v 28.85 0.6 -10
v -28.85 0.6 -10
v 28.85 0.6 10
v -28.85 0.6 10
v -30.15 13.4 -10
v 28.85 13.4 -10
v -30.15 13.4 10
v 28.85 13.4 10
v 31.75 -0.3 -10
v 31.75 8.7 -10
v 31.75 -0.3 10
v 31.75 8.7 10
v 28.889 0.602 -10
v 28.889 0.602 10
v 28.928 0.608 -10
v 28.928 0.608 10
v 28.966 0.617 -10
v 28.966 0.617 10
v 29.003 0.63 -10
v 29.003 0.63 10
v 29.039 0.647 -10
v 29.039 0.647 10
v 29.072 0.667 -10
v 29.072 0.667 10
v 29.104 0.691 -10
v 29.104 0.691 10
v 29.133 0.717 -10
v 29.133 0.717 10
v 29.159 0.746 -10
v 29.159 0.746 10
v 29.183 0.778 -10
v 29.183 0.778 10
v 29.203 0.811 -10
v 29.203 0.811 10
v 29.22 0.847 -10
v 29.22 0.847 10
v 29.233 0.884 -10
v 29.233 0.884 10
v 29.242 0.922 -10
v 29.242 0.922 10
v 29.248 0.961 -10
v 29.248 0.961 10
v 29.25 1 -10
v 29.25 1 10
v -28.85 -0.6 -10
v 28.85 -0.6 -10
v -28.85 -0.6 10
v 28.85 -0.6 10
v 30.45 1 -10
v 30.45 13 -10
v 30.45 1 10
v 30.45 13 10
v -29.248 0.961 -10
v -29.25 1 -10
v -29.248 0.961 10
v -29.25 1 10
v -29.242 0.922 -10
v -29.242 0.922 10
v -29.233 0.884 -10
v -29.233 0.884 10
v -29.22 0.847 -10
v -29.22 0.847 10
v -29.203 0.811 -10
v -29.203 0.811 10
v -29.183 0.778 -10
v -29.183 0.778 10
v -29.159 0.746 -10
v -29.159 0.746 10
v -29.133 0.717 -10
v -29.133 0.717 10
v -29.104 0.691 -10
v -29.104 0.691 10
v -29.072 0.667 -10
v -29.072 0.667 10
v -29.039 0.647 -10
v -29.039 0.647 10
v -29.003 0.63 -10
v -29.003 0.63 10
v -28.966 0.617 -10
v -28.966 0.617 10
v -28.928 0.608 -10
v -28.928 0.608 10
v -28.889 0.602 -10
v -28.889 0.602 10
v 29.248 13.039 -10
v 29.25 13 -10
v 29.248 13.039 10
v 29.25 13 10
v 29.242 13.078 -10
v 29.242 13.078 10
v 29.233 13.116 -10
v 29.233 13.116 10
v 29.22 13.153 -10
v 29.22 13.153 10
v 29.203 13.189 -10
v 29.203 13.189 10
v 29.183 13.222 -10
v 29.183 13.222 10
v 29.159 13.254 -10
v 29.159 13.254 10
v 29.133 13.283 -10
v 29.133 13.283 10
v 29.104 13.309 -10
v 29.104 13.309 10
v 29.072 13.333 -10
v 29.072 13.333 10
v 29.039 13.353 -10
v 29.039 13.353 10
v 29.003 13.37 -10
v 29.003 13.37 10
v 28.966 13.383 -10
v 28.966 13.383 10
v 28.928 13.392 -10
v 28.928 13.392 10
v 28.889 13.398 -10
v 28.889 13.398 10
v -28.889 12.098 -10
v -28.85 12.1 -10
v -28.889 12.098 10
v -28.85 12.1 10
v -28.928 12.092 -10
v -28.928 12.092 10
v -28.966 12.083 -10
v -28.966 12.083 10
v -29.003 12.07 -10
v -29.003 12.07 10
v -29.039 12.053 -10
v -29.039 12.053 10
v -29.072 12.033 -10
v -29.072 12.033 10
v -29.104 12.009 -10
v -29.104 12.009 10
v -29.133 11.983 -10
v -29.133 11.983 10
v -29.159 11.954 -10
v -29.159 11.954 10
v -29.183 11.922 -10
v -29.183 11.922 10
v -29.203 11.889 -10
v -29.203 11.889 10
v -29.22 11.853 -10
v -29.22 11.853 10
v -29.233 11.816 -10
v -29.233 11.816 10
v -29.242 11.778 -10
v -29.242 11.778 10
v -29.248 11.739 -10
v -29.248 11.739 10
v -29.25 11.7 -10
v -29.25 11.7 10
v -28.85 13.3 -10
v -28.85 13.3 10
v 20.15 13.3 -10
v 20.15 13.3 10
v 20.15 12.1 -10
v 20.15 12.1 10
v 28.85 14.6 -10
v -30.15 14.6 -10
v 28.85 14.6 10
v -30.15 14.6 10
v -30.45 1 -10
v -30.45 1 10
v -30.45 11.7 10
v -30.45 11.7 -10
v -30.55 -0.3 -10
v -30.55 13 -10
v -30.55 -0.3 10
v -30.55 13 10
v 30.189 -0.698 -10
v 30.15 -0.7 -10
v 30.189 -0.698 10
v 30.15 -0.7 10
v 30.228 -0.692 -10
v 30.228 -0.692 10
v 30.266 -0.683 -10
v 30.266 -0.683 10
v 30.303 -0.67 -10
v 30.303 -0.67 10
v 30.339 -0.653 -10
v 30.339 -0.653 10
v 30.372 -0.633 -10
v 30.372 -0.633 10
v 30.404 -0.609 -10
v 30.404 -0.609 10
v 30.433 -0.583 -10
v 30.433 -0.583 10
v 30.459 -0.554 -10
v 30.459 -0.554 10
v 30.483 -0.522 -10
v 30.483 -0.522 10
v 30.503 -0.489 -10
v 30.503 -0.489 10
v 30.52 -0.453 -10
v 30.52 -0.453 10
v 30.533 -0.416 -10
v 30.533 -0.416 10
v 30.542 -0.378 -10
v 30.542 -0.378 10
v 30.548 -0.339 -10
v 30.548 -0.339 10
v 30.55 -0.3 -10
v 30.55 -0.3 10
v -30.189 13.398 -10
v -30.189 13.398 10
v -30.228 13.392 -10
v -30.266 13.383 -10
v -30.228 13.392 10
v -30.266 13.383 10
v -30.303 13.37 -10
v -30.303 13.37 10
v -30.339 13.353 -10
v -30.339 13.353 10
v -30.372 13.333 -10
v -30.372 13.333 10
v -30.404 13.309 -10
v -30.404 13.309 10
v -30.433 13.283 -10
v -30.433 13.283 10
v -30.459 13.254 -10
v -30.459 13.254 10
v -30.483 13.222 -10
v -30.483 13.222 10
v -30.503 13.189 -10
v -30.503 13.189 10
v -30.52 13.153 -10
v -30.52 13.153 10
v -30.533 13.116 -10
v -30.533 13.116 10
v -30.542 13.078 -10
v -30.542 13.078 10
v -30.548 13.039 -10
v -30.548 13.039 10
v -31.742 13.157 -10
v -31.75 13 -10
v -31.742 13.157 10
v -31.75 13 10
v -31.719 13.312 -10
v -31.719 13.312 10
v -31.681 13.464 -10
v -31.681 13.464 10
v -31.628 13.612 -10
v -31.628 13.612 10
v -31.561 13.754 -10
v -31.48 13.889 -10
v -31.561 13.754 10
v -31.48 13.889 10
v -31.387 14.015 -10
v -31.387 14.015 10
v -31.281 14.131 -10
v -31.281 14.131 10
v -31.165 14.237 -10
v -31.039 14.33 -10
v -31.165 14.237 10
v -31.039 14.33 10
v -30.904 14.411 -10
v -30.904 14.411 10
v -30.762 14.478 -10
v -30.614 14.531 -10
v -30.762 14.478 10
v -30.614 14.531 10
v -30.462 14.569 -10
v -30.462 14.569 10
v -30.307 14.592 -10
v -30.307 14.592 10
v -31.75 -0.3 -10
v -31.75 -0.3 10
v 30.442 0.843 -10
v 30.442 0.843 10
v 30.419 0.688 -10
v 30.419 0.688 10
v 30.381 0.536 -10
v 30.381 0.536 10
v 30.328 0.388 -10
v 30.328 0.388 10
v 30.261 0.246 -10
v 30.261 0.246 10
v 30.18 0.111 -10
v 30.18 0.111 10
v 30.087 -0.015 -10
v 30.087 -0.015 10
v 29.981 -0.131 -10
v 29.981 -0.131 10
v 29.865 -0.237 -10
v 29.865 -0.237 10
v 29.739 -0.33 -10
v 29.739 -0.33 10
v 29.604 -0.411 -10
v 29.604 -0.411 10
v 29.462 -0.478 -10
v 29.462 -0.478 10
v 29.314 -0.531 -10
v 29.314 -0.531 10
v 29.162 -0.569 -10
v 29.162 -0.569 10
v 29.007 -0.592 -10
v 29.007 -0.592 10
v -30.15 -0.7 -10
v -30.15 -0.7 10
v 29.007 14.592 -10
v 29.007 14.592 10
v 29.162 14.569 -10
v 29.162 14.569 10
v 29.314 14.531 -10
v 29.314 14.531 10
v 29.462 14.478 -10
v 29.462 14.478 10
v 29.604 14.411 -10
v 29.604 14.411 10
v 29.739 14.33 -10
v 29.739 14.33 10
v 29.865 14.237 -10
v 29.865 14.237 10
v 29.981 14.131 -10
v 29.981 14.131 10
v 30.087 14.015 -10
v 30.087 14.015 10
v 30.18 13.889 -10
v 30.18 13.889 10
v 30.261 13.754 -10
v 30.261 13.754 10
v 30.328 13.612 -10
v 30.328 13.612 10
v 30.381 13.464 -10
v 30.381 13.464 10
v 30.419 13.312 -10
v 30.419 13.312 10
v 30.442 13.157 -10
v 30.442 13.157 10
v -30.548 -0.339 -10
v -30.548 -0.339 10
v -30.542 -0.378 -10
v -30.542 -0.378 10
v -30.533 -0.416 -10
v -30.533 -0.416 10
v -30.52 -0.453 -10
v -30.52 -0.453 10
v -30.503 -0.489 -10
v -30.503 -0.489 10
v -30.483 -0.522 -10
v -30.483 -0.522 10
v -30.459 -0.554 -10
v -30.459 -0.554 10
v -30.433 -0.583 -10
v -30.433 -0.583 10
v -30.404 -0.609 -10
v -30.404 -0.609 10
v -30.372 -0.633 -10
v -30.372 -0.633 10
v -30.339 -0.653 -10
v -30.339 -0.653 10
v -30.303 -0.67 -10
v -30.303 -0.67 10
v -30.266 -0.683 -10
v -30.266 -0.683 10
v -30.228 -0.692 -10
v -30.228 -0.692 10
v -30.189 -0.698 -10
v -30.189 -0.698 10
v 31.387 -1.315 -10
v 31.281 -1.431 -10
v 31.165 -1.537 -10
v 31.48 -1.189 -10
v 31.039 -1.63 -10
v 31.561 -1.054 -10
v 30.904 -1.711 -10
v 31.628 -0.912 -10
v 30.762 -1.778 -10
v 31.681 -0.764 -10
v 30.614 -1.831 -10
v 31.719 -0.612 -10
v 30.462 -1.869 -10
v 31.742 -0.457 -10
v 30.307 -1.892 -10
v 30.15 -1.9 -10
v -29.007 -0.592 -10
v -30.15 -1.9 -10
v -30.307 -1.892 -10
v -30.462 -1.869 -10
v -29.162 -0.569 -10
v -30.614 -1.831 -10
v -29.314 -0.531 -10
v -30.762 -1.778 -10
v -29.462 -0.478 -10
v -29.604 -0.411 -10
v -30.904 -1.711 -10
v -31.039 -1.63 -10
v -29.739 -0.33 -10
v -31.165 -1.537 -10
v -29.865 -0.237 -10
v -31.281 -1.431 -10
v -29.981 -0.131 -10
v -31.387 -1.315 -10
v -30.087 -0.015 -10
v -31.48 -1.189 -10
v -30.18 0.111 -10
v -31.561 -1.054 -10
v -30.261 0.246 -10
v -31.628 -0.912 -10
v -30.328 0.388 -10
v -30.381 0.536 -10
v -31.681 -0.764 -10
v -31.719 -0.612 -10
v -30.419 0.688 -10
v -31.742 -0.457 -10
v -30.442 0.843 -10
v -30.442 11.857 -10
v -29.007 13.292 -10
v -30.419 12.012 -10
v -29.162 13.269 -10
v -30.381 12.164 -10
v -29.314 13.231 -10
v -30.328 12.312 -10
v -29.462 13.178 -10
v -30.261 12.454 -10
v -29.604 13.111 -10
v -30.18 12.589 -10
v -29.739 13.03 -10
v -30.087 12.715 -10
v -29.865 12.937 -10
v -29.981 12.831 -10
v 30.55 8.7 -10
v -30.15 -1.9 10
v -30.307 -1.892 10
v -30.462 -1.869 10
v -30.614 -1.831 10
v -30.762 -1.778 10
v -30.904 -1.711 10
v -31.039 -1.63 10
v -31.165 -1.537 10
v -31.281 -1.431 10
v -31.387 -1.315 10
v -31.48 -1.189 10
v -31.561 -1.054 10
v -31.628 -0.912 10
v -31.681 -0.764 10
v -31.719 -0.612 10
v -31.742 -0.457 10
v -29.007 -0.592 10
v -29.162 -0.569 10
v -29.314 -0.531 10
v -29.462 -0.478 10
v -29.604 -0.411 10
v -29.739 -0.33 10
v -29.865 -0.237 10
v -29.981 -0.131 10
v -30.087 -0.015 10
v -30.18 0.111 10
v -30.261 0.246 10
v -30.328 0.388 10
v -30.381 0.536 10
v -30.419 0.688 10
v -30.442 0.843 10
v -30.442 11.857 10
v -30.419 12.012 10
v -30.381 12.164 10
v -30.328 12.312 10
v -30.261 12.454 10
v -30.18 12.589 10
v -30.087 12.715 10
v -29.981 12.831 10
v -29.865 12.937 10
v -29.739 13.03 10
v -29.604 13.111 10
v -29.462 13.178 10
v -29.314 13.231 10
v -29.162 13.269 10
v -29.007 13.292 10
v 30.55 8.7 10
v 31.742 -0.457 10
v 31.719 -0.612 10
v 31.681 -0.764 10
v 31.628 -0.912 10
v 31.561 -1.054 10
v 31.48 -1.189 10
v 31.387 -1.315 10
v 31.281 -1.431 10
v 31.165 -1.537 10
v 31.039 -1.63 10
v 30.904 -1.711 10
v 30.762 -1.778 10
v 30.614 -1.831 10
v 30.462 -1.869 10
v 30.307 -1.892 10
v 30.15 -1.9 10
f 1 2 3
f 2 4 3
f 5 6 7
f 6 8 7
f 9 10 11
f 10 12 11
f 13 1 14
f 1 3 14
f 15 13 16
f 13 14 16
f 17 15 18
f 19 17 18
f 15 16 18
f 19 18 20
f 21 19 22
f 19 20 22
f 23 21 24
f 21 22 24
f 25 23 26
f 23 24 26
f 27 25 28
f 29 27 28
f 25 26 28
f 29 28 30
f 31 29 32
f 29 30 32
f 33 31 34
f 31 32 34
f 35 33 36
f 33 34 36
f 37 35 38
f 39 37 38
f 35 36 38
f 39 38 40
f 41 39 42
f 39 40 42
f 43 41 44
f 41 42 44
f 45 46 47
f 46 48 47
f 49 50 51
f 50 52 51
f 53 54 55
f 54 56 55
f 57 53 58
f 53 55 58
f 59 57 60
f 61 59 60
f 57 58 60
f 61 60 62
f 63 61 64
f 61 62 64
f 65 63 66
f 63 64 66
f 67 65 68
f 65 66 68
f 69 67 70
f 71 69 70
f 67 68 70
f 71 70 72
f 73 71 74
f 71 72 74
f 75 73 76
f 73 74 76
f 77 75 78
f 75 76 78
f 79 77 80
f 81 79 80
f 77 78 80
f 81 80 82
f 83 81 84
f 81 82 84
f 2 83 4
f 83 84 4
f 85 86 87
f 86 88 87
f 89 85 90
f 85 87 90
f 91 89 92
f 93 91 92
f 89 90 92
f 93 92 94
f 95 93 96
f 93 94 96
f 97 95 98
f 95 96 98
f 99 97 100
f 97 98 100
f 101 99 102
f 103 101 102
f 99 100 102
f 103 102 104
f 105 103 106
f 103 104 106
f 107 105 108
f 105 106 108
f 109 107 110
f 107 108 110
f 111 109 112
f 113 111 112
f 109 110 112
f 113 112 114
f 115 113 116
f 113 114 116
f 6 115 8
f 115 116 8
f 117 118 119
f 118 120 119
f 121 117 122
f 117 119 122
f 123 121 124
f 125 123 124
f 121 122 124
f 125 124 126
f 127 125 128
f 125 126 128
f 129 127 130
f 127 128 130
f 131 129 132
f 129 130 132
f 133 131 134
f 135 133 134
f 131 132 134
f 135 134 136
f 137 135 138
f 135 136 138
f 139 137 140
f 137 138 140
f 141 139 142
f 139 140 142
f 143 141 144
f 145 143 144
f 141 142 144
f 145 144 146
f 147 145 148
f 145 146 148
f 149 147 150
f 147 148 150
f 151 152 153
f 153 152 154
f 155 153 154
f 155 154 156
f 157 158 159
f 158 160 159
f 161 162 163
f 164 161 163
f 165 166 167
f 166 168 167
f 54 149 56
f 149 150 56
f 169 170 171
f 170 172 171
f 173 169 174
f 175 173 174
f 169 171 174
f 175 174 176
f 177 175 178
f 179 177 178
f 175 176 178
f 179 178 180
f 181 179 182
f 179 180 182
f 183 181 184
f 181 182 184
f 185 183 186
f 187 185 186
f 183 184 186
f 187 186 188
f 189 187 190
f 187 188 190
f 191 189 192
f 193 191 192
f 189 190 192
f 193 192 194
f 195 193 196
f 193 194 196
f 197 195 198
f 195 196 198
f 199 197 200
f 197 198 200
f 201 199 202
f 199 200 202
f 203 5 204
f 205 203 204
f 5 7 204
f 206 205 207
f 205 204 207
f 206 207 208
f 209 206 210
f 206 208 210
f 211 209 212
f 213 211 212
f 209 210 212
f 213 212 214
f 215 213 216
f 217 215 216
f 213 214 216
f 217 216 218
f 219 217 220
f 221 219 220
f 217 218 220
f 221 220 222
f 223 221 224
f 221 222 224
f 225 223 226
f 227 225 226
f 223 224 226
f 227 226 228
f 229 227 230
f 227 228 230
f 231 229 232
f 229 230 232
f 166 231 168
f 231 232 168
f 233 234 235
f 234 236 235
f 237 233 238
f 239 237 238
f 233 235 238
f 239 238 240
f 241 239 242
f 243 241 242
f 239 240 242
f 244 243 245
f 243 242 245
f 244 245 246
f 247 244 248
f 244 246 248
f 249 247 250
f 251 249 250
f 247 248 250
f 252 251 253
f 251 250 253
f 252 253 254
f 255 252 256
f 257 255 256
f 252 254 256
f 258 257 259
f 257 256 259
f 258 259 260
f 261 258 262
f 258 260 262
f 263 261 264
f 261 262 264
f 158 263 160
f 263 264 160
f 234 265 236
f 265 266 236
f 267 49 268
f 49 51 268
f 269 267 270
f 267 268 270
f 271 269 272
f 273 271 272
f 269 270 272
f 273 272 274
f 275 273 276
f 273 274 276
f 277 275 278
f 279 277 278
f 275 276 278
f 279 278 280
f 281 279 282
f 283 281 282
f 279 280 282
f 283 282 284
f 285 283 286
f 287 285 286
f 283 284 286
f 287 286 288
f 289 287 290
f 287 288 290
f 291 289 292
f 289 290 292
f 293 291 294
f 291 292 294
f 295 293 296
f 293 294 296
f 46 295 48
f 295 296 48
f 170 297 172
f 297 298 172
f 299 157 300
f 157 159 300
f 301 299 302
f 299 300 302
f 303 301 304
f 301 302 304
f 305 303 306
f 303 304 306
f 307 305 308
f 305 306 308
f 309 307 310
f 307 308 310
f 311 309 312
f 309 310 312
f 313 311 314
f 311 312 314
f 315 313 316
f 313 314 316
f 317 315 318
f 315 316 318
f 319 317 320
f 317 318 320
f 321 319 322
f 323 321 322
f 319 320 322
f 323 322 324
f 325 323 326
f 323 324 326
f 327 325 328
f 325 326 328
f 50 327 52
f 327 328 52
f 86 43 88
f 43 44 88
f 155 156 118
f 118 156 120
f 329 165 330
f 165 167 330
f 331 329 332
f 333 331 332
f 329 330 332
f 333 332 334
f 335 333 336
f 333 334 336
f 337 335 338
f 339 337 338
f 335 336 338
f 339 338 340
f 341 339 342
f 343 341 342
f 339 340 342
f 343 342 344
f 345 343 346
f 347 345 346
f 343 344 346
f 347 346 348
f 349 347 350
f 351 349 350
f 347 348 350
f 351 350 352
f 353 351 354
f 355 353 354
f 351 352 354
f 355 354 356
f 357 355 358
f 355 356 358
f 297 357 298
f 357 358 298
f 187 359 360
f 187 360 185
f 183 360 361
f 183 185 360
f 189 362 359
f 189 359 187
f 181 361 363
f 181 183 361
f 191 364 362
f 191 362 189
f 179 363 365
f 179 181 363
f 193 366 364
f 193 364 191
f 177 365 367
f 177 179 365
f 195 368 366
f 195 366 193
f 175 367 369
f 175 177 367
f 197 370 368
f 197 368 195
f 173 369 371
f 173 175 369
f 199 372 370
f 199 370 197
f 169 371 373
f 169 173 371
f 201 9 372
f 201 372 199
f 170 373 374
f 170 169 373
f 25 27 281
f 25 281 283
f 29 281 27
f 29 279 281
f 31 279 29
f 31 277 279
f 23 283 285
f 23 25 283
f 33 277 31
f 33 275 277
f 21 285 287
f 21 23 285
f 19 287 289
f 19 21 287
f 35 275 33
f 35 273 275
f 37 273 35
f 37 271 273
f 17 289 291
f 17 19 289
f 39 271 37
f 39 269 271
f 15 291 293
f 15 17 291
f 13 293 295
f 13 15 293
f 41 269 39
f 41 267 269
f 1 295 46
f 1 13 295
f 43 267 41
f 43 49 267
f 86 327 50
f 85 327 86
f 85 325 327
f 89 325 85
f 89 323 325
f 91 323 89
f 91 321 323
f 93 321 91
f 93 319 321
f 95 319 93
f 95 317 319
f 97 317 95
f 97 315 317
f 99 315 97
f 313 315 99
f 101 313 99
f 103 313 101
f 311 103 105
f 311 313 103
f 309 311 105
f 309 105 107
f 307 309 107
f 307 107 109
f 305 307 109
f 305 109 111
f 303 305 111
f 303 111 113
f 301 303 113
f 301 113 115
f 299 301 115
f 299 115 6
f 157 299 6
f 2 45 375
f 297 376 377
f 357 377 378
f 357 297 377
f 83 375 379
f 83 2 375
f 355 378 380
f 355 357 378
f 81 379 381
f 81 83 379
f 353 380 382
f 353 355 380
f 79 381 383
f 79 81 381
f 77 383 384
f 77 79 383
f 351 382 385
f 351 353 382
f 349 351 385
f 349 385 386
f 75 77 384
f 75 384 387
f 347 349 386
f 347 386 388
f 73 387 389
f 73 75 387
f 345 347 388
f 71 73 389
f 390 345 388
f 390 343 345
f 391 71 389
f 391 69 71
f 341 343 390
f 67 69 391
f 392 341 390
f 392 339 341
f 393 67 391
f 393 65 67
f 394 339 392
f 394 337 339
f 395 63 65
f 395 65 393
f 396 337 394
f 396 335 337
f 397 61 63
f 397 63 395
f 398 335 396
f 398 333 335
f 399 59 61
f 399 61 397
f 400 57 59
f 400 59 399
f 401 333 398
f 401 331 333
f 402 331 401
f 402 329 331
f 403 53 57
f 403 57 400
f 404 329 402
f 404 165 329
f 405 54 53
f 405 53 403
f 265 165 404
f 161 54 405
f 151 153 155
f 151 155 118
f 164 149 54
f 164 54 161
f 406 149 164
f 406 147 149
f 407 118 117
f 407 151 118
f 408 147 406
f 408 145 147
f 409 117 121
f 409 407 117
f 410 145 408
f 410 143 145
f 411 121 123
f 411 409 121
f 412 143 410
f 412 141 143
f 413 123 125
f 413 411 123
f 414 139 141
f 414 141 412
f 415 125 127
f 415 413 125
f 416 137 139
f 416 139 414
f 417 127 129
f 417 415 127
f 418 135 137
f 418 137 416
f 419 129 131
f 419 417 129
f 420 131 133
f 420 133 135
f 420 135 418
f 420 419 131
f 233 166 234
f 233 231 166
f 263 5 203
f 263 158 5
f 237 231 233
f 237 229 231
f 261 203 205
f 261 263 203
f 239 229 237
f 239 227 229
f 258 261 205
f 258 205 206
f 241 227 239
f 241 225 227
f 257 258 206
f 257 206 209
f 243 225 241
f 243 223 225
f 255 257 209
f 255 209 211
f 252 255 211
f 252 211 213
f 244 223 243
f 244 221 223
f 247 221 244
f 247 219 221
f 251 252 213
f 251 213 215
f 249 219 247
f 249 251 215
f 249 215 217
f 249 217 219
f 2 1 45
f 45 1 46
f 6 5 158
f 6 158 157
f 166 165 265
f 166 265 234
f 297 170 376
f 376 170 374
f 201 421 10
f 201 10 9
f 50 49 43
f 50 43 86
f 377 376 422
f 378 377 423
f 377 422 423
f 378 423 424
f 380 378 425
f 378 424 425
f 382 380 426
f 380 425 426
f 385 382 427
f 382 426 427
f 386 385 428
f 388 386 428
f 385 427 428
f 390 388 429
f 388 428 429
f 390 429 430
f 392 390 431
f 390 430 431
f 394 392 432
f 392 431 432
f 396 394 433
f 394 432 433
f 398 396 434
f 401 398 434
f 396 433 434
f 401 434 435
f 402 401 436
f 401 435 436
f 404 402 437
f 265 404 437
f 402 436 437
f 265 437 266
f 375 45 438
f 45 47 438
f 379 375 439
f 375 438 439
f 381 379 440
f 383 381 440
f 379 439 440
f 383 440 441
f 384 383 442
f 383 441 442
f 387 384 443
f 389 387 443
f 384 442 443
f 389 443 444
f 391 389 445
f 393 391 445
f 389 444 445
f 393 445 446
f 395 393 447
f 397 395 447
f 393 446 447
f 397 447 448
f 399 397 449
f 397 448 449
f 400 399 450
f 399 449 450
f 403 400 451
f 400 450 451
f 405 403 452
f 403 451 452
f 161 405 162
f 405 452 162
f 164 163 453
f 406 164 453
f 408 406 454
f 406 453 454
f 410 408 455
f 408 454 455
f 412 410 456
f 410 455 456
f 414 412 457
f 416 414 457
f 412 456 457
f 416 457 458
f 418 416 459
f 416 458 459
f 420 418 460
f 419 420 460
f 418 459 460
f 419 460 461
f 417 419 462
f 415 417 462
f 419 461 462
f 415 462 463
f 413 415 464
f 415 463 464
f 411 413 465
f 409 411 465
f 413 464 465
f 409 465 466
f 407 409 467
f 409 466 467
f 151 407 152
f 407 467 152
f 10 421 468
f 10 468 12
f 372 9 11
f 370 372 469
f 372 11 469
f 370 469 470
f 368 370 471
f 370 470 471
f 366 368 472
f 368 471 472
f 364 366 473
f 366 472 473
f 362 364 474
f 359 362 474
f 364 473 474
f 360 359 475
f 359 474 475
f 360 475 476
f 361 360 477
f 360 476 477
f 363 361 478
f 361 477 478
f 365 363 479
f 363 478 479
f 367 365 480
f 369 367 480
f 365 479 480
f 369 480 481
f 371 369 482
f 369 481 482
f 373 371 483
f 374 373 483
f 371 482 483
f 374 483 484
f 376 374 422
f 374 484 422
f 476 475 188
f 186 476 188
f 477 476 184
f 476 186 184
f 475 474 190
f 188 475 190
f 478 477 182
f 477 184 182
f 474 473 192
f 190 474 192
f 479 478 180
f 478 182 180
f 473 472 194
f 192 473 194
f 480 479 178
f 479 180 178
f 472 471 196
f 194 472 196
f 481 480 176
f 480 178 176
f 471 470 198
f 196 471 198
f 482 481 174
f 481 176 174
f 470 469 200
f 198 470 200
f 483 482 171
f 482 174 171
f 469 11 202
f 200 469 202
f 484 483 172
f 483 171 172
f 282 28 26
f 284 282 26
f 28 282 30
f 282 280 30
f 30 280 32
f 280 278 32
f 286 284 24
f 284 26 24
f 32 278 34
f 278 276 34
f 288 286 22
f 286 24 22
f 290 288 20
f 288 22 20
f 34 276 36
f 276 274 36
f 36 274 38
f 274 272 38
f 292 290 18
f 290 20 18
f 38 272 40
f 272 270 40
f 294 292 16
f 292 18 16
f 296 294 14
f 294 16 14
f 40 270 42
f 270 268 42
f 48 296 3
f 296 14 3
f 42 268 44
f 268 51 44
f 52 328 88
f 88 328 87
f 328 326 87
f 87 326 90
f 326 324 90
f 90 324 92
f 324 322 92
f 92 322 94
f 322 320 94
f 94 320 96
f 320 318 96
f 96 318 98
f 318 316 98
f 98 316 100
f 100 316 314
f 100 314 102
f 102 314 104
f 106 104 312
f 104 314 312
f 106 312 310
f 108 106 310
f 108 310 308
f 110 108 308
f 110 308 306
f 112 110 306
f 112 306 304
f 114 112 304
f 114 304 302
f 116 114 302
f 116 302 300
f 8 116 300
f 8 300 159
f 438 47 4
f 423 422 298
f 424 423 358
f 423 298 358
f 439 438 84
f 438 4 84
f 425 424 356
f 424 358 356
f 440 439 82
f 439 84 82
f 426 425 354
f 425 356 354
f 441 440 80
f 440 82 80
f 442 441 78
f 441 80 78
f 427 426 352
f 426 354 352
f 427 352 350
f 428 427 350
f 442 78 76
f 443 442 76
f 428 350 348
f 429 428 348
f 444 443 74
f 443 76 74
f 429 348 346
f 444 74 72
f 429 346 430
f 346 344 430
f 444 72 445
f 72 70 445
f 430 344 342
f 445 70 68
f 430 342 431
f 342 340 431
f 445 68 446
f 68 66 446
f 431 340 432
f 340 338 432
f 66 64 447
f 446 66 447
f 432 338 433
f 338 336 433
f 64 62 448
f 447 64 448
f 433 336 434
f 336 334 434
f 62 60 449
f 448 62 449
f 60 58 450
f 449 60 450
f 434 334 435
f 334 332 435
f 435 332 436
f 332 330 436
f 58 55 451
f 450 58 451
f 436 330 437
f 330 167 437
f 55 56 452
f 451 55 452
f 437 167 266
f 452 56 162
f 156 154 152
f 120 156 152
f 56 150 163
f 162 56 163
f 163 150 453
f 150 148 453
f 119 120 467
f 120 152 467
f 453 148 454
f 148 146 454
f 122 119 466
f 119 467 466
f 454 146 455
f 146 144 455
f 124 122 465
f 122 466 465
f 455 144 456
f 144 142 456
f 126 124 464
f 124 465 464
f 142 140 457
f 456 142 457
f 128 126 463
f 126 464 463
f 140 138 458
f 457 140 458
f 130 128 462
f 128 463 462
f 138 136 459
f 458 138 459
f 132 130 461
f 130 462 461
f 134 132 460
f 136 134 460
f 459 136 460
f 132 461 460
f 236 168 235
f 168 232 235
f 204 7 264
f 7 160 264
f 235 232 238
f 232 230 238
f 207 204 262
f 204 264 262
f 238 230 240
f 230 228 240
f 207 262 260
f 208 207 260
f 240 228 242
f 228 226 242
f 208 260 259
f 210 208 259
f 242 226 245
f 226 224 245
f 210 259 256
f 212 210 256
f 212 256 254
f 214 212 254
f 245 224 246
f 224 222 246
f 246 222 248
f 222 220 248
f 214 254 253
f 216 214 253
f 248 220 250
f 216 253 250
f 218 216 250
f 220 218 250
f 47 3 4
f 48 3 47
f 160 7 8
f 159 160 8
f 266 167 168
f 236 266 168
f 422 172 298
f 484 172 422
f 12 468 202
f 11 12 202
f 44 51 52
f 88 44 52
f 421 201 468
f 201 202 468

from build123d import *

# Parameters (mm, degrees)
BOSS_EXTRUDE2_DEPTH = 10


with BuildPart() as part:
    # Sketch1 → Boss-Extrude2 (new, symmetric)
    with BuildSketch(Plane.XY):
        with BuildLine():
            Line((-28.85, 13.3), (20.15, 13.3))
            Line((20.15, 13.3), (20.15, 12.1))
            Line((20.15, 12.1), (-28.85, 12.1))
            ThreePointArc((-28.85, 12.1), (-29.132842712, 11.982842712), (-29.25, 11.7))
            Line((-29.25, 11.7), (-29.25, 1))
            ThreePointArc((-29.25, 1), (-29.132842712, 0.717157288), (-28.85, 0.6))
            Line((-28.85, 0.6), (28.85, 0.6))
            ThreePointArc((28.85, 0.6), (29.132842712, 0.717157288), (29.25, 1))
            Line((29.25, 1), (29.25, 13))
            ThreePointArc((29.25, 13), (29.132842712, 13.282842712), (28.85, 13.4))
            Line((28.85, 13.4), (-30.15, 13.4))
            ThreePointArc((-30.15, 13.4), (-30.432842712, 13.282842712), (-30.55, 13))
            Line((-30.55, 13), (-30.55, -0.3))
            ThreePointArc((-30.55, -0.3), (-30.432842712, -0.582842712), (-30.15, -0.7))
            Line((-30.15, -0.7), (30.15, -0.7))
            ThreePointArc((30.15, -0.7), (30.432842712, -0.582842712), (30.55, -0.3))
            Line((30.55, -0.3), (30.55, 8.7))
            Line((30.55, 8.7), (31.75, 8.7))
            Line((31.75, 8.7), (31.75, -0.3))
            ThreePointArc((31.75, -0.3), (31.28137085, -1.43137085), (30.15, -1.9))
            Line((30.15, -1.9), (-30.15, -1.9))
            ThreePointArc((-30.15, -1.9), (-31.28137085, -1.43137085), (-31.75, -0.3))
            Line((-31.75, -0.3), (-31.75, 13))
            ThreePointArc((-31.75, 13), (-31.28137085, 14.13137085), (-30.15, 14.6))
            Line((-30.15, 14.6), (28.85, 14.6))
            ThreePointArc((28.85, 14.6), (29.98137085, 14.13137085), (30.45, 13))
            Line((30.45, 13), (30.45, 1))
            ThreePointArc((30.45, 1), (29.98137085, -0.13137085), (28.85, -0.6))
            Line((28.85, -0.6), (-28.85, -0.6))
            ThreePointArc((-28.85, -0.6), (-29.98137085, -0.13137085), (-30.45, 1))
            Line((-30.45, 1), (-30.45, 11.7))
            ThreePointArc((-30.45, 11.7), (-29.98137085, 12.83137085), (-28.85, 13.3))
        make_face()
    extrude(amount=BOSS_EXTRUDE2_DEPTH, both=True)


solid = part.part
